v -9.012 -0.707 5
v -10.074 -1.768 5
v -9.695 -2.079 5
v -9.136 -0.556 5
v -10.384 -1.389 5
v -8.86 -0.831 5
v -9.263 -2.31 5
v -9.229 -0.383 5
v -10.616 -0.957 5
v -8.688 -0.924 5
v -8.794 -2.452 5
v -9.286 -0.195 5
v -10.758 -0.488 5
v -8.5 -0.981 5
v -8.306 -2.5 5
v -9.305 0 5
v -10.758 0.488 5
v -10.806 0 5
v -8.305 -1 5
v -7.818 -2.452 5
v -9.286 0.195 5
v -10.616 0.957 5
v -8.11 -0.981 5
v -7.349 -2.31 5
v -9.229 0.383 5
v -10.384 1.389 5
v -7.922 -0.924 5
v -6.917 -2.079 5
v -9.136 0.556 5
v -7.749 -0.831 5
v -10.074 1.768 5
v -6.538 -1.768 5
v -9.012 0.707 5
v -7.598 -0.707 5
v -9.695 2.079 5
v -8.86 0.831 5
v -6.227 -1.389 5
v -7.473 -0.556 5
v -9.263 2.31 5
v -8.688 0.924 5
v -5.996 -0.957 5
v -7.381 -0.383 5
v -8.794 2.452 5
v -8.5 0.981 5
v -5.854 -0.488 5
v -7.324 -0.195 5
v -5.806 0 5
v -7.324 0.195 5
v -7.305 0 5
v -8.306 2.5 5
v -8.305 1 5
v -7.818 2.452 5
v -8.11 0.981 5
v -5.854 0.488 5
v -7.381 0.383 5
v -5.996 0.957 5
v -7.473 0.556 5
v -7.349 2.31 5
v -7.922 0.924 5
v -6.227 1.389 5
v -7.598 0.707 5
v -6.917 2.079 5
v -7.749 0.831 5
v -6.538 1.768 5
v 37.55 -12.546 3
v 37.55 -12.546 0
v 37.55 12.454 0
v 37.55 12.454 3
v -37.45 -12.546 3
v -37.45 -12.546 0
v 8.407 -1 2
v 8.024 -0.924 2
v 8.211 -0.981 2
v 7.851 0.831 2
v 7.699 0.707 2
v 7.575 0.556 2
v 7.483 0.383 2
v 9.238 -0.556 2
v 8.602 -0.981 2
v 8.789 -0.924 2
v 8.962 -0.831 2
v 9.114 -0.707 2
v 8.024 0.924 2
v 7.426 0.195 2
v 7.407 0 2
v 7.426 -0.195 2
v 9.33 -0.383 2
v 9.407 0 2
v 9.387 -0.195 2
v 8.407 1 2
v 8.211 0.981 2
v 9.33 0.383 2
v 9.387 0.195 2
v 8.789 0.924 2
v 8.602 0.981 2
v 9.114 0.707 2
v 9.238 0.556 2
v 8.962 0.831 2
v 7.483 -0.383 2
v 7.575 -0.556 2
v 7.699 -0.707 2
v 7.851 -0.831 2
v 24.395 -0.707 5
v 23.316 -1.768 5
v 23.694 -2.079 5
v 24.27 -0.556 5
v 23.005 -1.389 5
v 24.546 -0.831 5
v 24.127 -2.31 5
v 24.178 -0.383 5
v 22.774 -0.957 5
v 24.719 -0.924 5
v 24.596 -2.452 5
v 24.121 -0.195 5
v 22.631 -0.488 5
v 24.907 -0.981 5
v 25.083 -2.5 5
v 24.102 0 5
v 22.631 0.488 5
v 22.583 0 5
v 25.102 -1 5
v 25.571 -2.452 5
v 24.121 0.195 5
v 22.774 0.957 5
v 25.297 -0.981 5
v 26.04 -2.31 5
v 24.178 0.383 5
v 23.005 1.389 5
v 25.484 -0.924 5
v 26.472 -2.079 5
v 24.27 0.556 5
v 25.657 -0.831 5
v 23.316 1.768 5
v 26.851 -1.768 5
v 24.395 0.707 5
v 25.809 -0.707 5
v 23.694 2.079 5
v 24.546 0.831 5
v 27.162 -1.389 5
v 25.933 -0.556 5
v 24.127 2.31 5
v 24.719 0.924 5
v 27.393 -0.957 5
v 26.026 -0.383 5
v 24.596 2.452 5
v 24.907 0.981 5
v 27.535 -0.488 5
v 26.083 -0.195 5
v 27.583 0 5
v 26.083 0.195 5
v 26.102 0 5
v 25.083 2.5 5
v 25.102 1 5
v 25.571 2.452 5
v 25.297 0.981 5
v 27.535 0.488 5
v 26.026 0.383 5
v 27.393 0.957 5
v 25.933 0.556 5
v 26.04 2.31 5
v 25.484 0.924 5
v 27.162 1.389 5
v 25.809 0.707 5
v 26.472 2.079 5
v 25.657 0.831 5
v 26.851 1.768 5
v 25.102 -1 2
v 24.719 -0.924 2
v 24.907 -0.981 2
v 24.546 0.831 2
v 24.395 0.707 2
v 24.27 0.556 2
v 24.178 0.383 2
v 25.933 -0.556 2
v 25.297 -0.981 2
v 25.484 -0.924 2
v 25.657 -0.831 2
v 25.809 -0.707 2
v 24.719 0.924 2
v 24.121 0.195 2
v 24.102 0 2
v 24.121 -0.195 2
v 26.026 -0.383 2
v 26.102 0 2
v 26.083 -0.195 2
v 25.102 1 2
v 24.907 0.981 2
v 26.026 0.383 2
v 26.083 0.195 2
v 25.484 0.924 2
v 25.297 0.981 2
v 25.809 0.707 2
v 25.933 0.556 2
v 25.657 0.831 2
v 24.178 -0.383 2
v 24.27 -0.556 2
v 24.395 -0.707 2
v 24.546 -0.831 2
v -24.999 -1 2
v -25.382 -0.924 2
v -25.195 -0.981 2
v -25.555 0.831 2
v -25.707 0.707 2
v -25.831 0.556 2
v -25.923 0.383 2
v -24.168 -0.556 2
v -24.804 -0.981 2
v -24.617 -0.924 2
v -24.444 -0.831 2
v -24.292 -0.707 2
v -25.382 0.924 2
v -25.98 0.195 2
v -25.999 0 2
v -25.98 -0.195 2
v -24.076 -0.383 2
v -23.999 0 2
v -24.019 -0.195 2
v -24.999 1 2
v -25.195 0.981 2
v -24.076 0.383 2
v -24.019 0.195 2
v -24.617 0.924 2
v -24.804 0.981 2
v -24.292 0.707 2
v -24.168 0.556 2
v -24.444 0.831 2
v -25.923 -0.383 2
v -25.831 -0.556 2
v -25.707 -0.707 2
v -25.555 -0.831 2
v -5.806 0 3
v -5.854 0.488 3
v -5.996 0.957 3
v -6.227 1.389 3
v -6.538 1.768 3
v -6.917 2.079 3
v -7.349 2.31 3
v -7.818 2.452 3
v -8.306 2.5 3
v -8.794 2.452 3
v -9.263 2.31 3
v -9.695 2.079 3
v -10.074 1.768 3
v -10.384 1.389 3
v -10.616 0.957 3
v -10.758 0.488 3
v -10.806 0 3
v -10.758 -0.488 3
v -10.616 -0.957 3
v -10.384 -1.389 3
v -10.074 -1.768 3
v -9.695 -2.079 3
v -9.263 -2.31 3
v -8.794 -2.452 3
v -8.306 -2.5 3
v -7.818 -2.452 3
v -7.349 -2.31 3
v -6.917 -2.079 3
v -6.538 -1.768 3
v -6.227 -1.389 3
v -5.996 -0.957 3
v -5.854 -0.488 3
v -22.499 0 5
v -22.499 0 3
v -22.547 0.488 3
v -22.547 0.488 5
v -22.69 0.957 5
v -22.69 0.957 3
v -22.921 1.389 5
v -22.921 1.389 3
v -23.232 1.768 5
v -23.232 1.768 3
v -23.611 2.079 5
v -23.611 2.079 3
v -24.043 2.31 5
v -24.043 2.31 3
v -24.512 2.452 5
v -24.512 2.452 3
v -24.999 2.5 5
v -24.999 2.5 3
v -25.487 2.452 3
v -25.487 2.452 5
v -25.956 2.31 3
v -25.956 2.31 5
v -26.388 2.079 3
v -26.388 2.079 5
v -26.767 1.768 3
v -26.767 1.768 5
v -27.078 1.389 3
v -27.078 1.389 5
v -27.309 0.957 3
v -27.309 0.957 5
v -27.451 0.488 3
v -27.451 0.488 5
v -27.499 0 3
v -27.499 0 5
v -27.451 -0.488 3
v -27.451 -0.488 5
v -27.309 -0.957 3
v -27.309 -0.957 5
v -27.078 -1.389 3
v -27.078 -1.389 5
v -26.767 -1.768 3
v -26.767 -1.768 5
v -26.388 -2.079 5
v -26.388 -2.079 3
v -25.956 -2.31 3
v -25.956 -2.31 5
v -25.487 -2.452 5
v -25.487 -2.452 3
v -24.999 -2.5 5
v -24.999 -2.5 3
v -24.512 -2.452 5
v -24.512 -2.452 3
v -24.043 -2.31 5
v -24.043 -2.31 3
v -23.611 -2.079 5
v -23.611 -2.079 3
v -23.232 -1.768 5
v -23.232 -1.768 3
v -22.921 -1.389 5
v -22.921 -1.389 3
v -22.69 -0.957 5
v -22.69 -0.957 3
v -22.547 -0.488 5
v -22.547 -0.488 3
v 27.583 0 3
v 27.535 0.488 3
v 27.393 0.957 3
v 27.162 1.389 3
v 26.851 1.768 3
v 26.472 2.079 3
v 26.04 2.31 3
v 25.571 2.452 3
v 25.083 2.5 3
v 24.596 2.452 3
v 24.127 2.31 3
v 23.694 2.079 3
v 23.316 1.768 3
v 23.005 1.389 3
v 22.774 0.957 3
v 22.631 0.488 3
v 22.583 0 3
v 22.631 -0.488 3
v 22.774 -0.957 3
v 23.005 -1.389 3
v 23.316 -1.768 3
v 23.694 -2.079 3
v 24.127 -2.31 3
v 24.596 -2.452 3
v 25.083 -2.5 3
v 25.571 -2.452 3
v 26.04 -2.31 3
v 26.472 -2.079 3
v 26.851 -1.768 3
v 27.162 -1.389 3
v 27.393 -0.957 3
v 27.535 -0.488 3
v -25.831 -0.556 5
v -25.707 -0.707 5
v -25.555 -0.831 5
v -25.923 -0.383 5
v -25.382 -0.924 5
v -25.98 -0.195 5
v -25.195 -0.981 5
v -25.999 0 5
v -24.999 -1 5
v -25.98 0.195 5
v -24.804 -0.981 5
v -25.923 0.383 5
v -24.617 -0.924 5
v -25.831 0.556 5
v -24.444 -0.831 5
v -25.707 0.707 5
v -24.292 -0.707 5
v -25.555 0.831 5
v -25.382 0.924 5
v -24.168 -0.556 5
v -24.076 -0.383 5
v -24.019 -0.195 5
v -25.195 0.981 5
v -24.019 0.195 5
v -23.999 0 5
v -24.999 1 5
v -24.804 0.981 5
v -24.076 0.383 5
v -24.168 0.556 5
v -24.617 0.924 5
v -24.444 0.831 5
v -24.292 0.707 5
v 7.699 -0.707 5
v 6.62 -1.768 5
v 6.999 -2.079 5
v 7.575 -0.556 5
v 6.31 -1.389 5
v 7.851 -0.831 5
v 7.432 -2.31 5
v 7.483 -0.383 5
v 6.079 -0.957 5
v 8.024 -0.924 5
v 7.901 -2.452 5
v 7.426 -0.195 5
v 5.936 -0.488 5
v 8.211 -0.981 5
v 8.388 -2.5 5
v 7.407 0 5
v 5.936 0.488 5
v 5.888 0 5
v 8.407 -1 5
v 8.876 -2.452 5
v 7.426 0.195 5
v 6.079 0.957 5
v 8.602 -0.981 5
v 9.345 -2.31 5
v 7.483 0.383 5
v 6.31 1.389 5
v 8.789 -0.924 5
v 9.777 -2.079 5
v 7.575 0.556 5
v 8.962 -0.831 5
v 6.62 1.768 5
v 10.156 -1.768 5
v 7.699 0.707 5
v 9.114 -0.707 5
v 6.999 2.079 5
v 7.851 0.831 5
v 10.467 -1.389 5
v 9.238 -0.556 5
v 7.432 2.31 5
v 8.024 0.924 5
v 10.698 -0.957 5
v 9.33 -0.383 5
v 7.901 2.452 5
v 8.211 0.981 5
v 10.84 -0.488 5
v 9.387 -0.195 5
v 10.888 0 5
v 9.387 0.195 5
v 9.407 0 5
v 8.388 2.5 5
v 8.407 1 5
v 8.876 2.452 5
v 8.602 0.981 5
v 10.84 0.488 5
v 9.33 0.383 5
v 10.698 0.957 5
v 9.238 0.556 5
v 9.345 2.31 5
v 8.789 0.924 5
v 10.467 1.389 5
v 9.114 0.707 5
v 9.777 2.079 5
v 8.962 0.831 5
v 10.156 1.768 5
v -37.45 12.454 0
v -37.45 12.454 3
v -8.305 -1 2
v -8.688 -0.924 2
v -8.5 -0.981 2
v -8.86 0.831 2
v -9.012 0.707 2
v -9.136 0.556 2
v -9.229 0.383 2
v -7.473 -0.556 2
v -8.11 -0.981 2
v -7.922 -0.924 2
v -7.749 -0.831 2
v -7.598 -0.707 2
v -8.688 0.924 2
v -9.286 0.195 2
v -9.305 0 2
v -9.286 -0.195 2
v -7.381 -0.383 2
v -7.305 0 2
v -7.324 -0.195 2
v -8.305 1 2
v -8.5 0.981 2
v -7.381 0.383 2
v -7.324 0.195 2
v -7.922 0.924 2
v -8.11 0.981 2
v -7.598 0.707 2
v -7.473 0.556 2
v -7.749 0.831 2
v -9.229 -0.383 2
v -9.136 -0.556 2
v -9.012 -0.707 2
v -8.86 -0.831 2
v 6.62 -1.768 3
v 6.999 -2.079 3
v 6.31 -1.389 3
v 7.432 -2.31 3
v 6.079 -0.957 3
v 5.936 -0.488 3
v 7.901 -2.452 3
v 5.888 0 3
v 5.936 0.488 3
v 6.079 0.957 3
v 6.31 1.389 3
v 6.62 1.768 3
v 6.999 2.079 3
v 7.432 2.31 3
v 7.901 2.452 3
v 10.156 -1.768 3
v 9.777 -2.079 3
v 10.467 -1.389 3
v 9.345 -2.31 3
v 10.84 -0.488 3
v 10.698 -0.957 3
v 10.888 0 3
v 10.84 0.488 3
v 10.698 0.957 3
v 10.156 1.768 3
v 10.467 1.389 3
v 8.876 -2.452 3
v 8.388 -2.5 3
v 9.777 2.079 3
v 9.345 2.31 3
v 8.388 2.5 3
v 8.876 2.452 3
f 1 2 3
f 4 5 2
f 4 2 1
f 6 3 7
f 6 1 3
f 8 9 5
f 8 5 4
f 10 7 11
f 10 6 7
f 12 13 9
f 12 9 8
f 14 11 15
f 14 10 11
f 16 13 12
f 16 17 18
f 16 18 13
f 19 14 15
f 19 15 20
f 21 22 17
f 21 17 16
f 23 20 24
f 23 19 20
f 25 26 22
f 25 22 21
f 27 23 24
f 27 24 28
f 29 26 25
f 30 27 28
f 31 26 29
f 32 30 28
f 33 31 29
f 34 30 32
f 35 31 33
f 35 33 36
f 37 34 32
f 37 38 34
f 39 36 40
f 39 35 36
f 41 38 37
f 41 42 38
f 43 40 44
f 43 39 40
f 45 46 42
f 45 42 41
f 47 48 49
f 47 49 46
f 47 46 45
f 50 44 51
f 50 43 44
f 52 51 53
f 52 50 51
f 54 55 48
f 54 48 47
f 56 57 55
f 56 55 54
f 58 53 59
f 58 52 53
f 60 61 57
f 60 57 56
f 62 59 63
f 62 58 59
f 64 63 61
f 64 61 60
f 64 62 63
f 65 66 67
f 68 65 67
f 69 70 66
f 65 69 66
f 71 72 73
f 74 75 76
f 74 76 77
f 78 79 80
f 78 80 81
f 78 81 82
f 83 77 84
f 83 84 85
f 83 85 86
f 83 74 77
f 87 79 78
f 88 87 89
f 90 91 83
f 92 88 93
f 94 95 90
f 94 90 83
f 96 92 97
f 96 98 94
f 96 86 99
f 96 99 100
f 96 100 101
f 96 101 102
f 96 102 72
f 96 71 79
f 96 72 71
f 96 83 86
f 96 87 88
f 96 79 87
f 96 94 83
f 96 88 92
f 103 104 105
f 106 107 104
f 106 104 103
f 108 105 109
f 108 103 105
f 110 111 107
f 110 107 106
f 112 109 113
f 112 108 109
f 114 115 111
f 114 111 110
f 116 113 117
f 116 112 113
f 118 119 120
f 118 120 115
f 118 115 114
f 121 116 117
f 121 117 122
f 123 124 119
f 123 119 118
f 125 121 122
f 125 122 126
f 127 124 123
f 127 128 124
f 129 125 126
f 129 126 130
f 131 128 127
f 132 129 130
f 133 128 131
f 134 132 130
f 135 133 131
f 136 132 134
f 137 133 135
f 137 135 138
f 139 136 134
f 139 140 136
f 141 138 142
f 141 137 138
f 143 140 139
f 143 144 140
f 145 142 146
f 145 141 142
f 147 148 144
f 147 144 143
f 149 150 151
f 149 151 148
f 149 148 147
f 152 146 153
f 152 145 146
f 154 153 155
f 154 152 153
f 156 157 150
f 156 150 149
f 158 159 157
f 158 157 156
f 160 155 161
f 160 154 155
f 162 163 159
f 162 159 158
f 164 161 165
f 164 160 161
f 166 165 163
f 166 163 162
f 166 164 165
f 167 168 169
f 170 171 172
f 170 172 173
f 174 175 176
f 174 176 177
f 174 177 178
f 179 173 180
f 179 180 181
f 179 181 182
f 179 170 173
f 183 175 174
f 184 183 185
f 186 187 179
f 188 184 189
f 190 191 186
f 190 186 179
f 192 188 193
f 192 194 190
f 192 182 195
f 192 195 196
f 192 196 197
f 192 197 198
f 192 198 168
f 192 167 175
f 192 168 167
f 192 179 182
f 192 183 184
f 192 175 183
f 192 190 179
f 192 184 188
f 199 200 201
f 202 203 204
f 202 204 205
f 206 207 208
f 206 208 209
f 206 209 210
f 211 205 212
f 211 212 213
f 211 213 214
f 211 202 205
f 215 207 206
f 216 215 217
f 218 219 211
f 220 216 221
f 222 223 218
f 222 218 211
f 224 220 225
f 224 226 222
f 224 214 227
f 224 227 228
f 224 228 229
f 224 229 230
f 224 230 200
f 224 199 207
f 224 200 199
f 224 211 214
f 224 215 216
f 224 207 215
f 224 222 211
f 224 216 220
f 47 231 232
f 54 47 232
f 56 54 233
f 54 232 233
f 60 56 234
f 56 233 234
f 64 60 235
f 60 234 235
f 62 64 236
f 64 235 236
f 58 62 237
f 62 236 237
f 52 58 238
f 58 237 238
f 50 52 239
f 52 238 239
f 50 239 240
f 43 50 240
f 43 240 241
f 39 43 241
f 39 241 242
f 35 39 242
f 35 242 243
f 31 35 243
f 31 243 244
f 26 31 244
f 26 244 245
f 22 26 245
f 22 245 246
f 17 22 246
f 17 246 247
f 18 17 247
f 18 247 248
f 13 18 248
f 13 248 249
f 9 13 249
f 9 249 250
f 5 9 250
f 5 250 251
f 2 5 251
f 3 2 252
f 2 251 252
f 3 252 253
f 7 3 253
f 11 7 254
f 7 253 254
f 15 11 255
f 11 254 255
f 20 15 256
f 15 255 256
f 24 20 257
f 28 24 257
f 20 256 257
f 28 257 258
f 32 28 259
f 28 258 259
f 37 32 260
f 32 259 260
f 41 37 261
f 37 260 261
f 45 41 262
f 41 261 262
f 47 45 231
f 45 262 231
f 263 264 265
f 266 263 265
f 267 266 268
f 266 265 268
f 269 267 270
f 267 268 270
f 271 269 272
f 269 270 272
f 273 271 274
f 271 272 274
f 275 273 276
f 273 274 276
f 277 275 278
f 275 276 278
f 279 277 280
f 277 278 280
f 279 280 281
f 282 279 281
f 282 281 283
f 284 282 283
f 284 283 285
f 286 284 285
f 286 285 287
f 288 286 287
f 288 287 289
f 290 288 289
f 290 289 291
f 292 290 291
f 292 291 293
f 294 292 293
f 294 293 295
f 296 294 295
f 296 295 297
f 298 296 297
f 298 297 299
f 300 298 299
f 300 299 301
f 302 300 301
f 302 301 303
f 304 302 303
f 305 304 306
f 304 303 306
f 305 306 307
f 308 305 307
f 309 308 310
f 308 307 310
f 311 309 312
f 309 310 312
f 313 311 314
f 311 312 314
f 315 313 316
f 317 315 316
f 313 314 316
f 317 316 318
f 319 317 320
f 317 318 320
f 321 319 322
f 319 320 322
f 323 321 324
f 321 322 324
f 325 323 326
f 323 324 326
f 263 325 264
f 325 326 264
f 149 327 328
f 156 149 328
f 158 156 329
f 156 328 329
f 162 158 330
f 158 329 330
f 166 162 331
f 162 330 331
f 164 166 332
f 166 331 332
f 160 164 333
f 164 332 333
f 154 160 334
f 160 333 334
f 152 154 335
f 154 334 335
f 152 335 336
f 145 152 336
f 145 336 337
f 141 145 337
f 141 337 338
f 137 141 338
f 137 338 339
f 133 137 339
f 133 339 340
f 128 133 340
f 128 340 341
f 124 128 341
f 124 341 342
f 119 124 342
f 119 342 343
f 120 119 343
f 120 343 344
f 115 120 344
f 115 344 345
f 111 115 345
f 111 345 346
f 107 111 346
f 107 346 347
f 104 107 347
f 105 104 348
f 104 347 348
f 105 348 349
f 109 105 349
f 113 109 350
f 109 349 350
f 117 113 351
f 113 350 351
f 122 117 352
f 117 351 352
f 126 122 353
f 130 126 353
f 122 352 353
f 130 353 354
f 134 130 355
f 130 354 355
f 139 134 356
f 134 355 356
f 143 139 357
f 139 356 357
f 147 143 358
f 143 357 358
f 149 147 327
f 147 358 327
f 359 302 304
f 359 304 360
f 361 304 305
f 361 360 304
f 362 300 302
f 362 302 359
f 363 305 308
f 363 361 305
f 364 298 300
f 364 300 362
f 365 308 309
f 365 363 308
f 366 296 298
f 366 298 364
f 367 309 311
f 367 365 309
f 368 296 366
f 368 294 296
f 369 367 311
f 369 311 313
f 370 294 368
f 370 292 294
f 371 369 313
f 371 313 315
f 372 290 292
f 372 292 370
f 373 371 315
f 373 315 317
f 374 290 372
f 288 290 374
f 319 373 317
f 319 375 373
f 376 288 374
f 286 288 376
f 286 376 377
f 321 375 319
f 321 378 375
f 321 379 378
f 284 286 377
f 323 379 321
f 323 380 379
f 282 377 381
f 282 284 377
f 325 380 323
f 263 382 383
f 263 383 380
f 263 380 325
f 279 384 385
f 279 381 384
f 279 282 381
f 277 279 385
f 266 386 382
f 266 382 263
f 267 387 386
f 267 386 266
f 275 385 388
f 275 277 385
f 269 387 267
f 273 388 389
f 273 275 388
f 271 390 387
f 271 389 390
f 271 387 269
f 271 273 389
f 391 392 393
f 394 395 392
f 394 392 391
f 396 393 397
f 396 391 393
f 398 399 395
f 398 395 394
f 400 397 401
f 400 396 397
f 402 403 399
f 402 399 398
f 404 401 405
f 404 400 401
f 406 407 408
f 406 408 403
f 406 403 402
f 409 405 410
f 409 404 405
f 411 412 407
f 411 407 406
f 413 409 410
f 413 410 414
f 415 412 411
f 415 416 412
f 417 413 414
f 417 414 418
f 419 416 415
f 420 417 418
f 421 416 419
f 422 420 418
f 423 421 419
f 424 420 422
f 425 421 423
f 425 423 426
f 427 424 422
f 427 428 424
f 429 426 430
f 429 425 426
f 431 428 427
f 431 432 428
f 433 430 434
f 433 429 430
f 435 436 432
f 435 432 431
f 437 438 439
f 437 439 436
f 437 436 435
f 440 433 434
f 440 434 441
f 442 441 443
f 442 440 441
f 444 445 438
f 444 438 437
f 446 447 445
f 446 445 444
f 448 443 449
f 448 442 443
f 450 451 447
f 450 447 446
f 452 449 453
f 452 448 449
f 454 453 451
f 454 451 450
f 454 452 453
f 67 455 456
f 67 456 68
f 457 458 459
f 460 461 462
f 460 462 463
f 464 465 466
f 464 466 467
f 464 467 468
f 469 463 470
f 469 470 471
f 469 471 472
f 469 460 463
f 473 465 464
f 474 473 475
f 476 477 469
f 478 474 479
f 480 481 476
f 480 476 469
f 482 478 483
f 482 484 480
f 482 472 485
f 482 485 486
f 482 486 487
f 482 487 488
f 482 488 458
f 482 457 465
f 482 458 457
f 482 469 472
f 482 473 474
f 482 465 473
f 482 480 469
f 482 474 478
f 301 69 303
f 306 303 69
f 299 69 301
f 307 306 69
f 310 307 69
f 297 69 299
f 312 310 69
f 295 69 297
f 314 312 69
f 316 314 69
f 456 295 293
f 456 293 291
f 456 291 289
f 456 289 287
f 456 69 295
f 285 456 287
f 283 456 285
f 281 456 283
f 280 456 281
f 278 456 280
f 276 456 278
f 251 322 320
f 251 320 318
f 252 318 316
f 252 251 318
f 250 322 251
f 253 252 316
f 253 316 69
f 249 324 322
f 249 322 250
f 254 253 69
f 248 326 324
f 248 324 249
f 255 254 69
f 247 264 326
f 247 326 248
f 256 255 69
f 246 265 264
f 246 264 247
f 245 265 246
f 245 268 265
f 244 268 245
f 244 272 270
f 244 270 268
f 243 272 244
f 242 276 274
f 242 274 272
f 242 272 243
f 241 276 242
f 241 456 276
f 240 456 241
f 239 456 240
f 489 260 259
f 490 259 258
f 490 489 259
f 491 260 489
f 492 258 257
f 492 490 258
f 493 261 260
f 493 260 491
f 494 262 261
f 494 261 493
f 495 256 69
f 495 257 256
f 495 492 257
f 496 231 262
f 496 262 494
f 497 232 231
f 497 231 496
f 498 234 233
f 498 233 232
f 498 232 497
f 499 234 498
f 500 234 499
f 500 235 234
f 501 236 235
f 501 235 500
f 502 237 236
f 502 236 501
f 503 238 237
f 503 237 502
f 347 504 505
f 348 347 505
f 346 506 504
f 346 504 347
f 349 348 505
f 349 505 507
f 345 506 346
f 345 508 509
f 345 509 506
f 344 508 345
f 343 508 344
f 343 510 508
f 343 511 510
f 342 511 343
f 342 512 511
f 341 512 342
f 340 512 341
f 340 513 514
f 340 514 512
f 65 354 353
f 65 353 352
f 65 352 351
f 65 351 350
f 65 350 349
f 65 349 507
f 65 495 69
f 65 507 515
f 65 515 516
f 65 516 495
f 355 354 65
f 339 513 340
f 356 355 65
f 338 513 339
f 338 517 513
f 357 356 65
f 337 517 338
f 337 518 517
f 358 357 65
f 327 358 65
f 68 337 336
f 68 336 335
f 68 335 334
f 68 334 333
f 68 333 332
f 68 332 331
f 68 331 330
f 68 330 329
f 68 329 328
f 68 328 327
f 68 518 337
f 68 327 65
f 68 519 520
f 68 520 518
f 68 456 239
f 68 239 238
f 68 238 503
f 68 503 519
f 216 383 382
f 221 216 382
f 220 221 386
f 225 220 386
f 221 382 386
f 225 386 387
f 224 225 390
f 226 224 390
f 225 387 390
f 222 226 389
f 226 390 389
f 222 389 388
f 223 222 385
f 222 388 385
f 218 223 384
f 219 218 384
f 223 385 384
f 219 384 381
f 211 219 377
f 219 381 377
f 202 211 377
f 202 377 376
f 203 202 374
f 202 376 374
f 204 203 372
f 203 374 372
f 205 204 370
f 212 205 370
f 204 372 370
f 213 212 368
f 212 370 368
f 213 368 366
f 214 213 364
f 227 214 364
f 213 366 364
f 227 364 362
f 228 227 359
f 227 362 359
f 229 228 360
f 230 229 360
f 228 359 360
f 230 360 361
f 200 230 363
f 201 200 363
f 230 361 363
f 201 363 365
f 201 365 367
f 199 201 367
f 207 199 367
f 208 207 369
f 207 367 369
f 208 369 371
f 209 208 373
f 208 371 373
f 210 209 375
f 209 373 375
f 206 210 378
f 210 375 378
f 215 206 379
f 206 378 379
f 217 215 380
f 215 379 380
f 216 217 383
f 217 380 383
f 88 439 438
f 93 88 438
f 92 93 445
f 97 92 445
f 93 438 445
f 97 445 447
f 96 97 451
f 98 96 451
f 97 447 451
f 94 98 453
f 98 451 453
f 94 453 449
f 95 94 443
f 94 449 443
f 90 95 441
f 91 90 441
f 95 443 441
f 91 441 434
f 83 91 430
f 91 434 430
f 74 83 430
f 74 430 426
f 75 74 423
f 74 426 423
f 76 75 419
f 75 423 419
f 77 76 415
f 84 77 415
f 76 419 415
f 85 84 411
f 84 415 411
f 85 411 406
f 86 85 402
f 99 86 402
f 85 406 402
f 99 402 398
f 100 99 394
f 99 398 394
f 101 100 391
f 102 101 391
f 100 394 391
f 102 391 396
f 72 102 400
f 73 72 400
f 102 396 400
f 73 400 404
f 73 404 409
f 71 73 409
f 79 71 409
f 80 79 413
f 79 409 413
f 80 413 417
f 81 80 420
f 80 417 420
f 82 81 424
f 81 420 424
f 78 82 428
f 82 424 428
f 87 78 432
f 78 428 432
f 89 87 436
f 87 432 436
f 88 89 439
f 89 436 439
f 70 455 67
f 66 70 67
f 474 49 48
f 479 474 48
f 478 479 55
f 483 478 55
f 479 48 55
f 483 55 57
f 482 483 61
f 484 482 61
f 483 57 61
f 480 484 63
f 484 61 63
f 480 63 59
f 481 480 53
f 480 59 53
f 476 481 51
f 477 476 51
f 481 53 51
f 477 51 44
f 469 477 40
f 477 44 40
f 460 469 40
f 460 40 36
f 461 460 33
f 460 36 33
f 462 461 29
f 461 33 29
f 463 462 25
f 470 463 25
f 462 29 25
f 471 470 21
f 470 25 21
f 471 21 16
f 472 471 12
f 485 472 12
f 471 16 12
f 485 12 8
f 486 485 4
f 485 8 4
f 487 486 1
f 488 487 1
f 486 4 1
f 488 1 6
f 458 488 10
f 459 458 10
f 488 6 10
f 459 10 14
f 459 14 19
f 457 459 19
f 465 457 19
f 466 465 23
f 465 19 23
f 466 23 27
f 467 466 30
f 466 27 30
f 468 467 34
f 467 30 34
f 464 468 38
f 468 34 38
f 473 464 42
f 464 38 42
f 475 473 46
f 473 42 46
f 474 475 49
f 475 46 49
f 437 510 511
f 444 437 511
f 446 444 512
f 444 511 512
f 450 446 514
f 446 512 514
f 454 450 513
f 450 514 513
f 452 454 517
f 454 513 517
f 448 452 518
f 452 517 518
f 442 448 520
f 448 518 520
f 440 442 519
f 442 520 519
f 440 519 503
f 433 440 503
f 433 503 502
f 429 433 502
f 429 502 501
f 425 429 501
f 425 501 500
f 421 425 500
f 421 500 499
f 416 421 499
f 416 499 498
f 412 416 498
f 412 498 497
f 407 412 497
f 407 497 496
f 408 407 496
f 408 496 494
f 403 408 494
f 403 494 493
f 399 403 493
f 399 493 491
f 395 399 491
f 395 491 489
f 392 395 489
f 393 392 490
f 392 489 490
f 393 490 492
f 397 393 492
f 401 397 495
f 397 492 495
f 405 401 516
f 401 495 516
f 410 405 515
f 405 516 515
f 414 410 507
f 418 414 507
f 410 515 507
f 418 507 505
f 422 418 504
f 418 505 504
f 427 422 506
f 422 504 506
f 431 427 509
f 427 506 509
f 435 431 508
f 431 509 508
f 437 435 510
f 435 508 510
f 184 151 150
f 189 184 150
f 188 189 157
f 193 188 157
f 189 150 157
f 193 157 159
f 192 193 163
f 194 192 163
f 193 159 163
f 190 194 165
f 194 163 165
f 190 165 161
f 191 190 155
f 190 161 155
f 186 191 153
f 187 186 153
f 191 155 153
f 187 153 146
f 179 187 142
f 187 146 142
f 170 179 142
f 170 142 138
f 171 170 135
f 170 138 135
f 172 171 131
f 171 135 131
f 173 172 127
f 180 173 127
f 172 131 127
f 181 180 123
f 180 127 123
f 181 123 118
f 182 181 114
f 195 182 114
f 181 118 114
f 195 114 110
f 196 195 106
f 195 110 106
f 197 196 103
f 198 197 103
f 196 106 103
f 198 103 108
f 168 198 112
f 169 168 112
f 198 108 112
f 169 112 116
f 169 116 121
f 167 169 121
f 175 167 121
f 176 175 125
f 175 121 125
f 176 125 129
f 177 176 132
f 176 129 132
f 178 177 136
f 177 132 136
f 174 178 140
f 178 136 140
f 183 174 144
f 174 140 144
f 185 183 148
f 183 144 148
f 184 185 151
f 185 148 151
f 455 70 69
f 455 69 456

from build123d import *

# Parameters (mm, degrees)
F0_W     = 75
F0_H     = 25
F1_DEPTH = 3
F2_R     = 2.5
F3_DEPTH = 5
F4_R     = 1
F5_DEPTH = 3


with BuildPart() as f1:
    # F0 (on Top) → F1 (new body)
    with BuildSketch(Plane.XY):
        with Locations((0.05, -0.046321)):
            Rectangle(F0_W, F0_H)
    extrude(amount=F1_DEPTH)

    # F2 (on Top) → F3 (join)
    with BuildSketch(Plane.XY):
        with Locations((-24.999432, 0)):
            Circle(F2_R)
        with Locations((-8.305821, 0)):
            Circle(F2_R)
        with Locations((8.388246, 0)):
            Circle(F2_R)
        with Locations((25.083415, 0)):
            Circle(F2_R)
    extrude(amount=F3_DEPTH)

    # F4 (on face) → F5 (cut)
    with BuildSketch(Plane.XY.offset(5)):
        with Locations((-24.999432, 0)):
            Circle(F4_R)
        with Locations((-8.304862, 0)):
            Circle(F4_R)
        with Locations((8.406557, 0)):
            Circle(F4_R)
        with Locations((25.101803, 0)):
            Circle(F4_R)
    extrude(amount=-F5_DEPTH, mode=Mode.SUBTRACT)


solid = f1.part
